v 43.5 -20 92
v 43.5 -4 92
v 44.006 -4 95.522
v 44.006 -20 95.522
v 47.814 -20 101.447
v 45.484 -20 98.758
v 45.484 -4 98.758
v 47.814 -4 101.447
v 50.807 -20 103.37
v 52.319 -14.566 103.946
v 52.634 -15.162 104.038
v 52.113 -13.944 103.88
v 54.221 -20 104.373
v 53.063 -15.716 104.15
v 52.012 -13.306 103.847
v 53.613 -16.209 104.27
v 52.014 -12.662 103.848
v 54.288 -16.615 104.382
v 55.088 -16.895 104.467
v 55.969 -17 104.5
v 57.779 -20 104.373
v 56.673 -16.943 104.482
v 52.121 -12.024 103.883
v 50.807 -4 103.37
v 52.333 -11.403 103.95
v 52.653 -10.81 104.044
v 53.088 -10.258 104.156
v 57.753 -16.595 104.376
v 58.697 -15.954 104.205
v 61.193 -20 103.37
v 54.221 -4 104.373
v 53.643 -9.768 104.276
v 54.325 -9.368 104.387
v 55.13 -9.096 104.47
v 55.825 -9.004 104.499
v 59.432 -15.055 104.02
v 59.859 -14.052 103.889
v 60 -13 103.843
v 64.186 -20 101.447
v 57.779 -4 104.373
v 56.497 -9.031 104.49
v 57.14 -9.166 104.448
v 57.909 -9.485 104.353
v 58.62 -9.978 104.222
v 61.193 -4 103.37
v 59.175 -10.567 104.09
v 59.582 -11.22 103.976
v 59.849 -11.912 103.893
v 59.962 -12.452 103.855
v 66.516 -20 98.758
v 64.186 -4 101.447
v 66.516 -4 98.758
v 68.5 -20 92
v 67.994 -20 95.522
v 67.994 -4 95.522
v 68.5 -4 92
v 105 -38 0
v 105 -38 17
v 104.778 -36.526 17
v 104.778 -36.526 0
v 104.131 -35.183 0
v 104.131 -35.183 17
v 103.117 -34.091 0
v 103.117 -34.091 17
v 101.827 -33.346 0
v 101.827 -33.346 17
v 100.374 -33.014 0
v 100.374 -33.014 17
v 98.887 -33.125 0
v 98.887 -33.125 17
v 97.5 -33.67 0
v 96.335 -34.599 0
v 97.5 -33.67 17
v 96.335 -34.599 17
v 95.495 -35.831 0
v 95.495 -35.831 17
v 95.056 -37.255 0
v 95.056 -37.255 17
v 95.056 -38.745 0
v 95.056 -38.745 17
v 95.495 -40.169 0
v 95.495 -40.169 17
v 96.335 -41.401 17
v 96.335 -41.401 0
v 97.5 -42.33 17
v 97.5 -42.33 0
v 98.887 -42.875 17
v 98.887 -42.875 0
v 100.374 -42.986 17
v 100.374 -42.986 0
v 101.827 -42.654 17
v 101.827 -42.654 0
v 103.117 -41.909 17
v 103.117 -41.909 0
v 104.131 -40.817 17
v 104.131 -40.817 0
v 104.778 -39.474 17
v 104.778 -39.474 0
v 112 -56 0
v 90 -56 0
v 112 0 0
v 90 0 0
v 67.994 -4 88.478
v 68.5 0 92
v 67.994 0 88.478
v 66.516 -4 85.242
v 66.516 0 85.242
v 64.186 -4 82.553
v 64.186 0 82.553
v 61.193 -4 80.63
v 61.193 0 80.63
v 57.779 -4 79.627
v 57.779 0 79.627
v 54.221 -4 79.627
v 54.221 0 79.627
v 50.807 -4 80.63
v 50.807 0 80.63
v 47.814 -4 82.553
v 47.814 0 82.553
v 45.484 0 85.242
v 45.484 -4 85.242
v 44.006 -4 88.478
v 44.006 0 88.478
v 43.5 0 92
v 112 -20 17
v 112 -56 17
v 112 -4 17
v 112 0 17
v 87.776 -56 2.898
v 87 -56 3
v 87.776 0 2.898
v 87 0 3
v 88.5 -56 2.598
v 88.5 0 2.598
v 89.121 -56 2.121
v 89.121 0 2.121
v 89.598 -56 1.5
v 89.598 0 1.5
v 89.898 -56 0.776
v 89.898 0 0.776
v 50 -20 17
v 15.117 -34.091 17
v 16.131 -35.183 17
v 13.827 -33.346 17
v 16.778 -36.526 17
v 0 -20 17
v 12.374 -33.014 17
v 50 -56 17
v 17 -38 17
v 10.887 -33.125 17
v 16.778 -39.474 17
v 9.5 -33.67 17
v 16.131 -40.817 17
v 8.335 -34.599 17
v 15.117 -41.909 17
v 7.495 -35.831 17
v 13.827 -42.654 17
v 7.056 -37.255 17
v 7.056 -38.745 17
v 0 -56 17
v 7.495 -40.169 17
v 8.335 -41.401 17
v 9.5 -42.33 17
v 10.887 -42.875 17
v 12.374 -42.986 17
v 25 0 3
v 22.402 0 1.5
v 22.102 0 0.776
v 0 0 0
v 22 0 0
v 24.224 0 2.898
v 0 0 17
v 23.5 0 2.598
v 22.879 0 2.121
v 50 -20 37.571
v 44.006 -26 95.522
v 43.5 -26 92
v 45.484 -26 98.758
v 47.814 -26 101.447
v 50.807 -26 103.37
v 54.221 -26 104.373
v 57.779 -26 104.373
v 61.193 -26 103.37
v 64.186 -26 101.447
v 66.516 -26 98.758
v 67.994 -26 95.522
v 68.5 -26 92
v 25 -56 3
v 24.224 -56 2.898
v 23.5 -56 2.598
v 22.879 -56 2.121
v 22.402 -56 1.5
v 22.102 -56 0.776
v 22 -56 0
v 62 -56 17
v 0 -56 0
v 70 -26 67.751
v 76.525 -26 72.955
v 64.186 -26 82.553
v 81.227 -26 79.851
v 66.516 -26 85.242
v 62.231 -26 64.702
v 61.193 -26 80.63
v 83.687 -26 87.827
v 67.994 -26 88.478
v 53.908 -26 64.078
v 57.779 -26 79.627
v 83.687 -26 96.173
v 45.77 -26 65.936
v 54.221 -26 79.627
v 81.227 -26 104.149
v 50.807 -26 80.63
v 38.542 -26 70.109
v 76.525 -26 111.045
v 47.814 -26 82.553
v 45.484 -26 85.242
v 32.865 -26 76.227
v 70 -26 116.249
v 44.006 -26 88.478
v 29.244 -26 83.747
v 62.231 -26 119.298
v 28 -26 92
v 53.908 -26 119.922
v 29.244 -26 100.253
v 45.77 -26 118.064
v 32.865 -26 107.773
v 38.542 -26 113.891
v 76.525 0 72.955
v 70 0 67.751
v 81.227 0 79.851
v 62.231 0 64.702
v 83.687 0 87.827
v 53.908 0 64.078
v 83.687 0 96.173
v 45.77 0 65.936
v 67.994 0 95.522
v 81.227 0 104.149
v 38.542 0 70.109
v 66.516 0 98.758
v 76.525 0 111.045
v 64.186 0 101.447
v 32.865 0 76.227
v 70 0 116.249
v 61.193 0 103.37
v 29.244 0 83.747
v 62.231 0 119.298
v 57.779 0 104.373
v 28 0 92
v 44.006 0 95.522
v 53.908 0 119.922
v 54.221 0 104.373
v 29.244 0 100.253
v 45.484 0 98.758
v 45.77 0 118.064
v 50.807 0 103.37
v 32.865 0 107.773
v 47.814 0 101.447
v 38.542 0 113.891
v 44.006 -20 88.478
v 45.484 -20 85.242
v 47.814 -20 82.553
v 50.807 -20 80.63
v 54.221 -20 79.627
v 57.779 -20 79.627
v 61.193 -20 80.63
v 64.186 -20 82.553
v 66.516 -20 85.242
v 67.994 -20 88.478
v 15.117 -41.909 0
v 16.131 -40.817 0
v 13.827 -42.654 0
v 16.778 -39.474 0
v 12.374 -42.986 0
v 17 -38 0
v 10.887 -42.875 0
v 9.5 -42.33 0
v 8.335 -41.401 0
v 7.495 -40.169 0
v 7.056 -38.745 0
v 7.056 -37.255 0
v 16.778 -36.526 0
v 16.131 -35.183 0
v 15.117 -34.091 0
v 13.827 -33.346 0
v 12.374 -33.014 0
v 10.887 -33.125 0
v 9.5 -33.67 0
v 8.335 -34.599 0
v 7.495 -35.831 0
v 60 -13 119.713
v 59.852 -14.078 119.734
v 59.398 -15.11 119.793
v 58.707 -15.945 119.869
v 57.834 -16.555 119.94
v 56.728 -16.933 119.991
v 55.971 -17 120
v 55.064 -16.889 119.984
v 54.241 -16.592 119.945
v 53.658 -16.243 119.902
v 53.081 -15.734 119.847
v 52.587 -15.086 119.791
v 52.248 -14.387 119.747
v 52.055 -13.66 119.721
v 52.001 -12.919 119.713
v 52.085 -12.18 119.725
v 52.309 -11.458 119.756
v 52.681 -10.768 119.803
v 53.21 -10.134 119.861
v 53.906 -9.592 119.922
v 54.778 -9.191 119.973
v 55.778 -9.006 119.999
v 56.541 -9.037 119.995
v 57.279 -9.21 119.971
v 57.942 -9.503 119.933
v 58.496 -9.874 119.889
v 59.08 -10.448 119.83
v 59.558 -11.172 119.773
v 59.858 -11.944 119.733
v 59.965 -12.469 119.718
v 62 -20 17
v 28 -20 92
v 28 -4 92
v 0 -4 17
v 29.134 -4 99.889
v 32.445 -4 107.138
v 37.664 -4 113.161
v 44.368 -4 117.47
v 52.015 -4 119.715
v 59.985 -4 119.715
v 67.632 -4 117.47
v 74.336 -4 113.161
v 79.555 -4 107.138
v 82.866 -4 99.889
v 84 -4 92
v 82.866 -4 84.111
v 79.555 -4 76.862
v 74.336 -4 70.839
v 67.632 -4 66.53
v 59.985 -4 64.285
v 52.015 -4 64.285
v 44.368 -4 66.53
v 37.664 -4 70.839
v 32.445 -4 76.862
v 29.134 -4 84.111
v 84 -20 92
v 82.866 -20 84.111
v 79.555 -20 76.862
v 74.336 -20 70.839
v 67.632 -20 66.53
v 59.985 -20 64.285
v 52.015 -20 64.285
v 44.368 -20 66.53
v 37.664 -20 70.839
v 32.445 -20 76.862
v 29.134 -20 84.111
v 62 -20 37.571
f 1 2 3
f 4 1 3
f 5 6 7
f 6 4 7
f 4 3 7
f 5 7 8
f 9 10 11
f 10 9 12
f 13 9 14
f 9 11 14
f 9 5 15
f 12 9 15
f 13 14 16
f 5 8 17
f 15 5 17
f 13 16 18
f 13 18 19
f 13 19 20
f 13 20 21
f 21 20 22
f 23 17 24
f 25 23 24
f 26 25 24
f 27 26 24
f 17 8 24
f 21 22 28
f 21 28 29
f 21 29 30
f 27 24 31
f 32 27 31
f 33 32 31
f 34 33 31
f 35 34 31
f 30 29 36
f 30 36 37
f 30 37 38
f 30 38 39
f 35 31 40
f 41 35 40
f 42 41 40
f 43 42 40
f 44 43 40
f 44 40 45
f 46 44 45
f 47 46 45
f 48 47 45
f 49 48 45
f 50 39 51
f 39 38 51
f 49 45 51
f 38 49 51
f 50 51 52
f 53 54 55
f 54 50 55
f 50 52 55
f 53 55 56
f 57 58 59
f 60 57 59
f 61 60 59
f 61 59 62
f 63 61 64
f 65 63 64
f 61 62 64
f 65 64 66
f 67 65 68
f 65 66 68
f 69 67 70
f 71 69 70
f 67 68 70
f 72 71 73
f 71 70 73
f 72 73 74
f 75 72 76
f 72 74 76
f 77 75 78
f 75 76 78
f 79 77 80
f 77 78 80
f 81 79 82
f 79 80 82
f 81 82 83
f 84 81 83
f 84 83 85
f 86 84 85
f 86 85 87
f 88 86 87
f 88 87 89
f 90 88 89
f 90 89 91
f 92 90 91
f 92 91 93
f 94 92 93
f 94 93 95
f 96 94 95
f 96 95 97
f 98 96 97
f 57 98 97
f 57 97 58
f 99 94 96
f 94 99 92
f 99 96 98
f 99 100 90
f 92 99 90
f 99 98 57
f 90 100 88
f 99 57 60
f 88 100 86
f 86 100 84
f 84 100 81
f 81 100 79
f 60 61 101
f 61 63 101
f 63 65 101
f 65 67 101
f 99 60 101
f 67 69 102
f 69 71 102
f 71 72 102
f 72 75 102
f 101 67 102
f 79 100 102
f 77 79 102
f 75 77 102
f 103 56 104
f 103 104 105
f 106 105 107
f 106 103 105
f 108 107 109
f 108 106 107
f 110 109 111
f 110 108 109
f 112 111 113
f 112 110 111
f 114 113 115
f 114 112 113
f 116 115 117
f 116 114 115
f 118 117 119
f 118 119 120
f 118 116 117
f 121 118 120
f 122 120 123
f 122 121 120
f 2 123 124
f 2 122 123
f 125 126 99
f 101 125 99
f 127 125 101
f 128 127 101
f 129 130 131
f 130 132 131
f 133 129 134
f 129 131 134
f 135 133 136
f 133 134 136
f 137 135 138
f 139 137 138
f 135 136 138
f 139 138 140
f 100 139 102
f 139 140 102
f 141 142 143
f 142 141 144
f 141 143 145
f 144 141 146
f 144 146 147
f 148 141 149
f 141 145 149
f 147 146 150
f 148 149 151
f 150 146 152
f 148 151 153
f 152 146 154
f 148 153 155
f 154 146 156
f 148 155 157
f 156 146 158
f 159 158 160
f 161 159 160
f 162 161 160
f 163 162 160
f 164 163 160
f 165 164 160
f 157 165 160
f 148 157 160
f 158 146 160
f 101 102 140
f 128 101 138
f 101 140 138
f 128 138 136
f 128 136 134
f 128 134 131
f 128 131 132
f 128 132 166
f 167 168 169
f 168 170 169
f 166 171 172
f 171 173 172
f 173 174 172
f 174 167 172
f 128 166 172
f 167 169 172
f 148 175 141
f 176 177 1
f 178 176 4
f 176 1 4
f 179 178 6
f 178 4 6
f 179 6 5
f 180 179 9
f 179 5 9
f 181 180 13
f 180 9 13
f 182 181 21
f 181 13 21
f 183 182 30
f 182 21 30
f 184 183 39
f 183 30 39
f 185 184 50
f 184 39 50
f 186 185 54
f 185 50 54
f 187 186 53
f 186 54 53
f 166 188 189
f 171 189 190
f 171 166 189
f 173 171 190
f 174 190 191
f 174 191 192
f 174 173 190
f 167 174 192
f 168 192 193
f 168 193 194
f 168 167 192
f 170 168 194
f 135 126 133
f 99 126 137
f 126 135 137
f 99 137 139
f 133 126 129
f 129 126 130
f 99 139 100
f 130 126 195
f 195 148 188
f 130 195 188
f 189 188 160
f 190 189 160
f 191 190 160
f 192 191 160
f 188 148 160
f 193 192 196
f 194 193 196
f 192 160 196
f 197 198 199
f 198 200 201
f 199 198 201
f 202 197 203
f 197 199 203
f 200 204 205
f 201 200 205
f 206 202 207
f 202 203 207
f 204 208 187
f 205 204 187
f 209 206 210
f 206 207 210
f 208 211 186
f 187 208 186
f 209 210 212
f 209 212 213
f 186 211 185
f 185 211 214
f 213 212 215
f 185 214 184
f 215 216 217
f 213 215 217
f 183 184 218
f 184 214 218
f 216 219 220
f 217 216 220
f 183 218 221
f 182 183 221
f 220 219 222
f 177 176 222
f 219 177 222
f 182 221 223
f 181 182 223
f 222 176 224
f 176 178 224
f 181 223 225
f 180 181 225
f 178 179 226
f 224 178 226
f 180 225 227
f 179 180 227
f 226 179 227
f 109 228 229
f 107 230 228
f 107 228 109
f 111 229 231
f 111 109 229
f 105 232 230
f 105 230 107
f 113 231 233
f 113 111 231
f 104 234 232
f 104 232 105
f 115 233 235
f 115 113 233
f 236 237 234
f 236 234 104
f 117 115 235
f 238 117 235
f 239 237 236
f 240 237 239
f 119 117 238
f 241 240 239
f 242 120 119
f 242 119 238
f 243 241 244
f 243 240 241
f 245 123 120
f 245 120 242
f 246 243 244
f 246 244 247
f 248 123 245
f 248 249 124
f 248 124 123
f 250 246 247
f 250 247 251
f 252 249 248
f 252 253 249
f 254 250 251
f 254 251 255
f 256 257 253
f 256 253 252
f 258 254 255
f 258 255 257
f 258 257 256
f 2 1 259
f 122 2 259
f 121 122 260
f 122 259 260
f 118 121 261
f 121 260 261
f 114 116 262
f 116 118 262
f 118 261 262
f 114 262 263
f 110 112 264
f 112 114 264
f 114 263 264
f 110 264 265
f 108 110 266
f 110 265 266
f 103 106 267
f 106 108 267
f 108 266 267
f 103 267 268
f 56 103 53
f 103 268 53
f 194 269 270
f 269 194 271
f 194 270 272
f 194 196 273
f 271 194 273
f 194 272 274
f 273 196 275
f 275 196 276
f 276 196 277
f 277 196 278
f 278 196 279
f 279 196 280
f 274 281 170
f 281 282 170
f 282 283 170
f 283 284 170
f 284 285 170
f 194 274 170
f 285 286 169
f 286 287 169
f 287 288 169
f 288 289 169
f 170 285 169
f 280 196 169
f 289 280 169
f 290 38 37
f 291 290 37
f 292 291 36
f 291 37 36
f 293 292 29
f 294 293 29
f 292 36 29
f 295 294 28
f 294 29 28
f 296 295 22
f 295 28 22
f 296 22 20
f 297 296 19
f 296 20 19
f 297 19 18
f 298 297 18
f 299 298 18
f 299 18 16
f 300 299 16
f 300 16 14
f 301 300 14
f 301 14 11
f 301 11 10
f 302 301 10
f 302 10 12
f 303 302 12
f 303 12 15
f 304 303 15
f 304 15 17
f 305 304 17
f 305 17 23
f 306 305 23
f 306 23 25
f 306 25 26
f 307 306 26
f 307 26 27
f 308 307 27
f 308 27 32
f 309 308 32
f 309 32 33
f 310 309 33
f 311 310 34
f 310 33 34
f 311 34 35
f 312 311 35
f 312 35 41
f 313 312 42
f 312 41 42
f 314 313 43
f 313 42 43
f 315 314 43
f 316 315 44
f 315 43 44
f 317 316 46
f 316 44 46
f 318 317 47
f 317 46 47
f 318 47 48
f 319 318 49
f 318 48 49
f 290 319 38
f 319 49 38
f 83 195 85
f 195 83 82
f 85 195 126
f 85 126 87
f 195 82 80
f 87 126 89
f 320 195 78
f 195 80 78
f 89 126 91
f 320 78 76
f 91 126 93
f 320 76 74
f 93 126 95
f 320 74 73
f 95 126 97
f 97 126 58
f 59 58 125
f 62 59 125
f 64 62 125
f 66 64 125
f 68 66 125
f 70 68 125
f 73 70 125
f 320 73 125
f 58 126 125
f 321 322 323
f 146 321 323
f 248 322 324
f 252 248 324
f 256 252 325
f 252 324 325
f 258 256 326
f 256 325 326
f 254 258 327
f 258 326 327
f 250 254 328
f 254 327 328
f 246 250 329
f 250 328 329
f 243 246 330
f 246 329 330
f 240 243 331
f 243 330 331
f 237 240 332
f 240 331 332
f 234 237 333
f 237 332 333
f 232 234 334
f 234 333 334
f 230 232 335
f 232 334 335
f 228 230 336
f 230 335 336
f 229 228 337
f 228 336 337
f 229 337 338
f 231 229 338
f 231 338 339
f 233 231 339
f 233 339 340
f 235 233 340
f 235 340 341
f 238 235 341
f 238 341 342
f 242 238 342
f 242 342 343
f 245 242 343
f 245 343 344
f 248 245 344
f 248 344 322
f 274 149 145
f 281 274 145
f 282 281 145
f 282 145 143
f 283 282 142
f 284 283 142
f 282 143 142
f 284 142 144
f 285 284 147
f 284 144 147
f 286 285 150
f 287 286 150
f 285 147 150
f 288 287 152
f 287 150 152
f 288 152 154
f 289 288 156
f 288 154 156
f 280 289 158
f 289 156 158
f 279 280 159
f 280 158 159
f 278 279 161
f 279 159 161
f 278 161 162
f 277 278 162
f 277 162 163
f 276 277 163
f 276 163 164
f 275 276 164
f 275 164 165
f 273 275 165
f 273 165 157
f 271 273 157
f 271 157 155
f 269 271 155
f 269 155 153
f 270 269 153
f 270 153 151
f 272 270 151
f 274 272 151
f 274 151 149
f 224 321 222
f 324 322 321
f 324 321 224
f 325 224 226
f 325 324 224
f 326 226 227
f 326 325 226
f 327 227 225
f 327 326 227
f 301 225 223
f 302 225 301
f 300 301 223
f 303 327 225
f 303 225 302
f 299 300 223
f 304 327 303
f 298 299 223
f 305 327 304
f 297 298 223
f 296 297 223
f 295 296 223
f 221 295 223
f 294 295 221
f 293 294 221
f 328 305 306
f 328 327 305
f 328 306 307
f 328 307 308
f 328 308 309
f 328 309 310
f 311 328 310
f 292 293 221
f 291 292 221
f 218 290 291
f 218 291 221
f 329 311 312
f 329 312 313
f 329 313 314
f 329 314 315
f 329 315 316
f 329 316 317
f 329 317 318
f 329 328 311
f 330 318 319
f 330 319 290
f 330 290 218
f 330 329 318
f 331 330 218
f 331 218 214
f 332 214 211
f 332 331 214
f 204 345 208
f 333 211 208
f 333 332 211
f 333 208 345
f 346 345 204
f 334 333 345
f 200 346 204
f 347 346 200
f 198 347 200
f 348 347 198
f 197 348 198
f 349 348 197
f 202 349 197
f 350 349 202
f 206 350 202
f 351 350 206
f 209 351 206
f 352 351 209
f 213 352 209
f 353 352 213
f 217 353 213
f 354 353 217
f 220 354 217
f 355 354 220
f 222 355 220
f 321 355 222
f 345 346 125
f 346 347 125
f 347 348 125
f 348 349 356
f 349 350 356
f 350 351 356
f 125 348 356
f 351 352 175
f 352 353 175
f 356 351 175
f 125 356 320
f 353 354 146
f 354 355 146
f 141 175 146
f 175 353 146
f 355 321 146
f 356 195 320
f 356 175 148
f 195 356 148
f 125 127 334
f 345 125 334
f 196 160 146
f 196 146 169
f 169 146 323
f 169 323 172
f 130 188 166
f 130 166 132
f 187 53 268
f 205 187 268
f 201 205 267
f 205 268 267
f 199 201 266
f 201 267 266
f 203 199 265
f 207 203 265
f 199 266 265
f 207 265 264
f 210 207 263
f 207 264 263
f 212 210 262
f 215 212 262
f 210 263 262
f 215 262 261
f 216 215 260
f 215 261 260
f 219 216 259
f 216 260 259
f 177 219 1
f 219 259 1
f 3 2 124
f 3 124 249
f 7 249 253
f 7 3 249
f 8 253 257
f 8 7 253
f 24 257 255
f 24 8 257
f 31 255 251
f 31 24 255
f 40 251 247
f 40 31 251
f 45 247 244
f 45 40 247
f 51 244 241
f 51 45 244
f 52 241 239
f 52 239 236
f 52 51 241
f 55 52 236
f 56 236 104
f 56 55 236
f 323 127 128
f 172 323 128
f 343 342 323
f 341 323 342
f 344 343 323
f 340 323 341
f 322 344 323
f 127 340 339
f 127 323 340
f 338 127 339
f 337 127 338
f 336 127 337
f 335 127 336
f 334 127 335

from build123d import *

# Parameters (mm, degrees)
F1_DEPTH       = 112
F2_W           = 4
F2_H           = 75
F3_DEPTH       = 112.001
F5_DEPTH       = 50
F7_DEPTH       = 50
F9_DEPTH       = 25
F8_R           = 12.5
F10_DEPTH      = 4
F10_DEPTH_BACK = 22
F12_W          = 68
F12_H          = 3
F13_DEPTH      = 56.001
F14_R          = 5
F15_DEPTH      = 25
F16_R          = 4
F17_DEPTH      = 117.001
F18_R          = 4
F19_DEPTH      = 80
F11_R          = 12.5
F20_DEPTH      = 25
F20_DEPTH_BACK = 25
F21_R          = 2.99999


# Not quite as in the source:
# - a fillet or chamfer is up to 0.001 mm smaller than in the source, because OpenCascade refuses the exact size
# - a feature names something its author has since deleted; it is built from what else it names


with BuildPart() as f1:
    # F0 (on Right) → F1 (new body)
    with BuildSketch(Plane.YZ):
        Polygon((-56, 0), (0, 0), (0, 49), (0, 92), (-20, 92), (-20, 37.5714285714), (-56, 17), align=None)
    extrude(amount=F1_DEPTH)

    # F2 (on face) → F3 (cut, through all)
    with BuildSketch(Plane.YZ.offset(112)):
        with Locations((-2, 54.5)):
            Rectangle(F2_W, F2_H)
    extrude(amount=-F3_DEPTH, mode=Mode.SUBTRACT)

    # F4 (on face) → F5 (cut)
    with BuildSketch(Plane.YZ.offset(112)):
        Polygon((-20, 37.5714285714), (-56, 17), (-20, 17), align=None)
    extrude(amount=-F5_DEPTH, mode=Mode.SUBTRACT)

    # F6 (on face) → F7 (cut)
    with BuildSketch(Plane(origin=(0, 0, 0), x_dir=(0, -1, 0), z_dir=(-1, 0, 0))):
        Polygon((20, 17), (56, 17), (20, 37.5714285714), align=None)
    extrude(amount=-F7_DEPTH, mode=Mode.SUBTRACT)

    # F8 (on face) → F9 (cut)
    with BuildSketch(Plane(origin=(0, -4, 0), x_dir=(-1, 0, 0), z_dir=(0, 1, 0))):
        Polygon((-112, 17), (-84, 92), (-112, 92), align=None)
        Polygon((0, 92), (-28, 92), (0, 17), align=None)
    extrude(amount=-F9_DEPTH, mode=Mode.SUBTRACT)

    # F8 (on face) → F10 (join, two sides)
    with BuildSketch(Plane(origin=(0, -4, 0), x_dir=(-1, 0, 0), z_dir=(0, 1, 0))) as f10_sk:
        with BuildLine():
            ThreePointArc((-84, 92), (-56, 64), (-28, 92))
            ThreePointArc((-28, 92), (-56, 120), (-84, 92))
        make_face()
        with Locations((-56, 92)):
            Circle(F8_R, mode=Mode.SUBTRACT)
    extrude(amount=F10_DEPTH)
    extrude(f10_sk.sketch, amount=-F10_DEPTH_BACK)

    # F12 (on face) → F13 (cut, through all)
    with BuildSketch(Plane.XZ.offset(56)):
        with Locations((56, 1.5)):
            Rectangle(F12_W, F12_H)
    extrude(amount=-F13_DEPTH, mode=Mode.SUBTRACT)

    # F14 (on face) → F15 (cut)
    with BuildSketch(Plane.XY.offset(17)):
        with Locations((12, -38)):
            Circle(F14_R)
        with Locations((100, -38)):
            Circle(F14_R)
    extrude(amount=-F15_DEPTH, mode=Mode.SUBTRACT)

    # F16 (on face) → F17 (cut, through all)
    with BuildSketch(Plane(origin=(0, 0, 3), x_dir=(1, 0, 0), z_dir=(0, 0, -1))):
        with Locations((56, 13)):
            Circle(F16_R)
    extrude(amount=-F17_DEPTH, mode=Mode.SUBTRACT)

    # F18 (on face) → F19 (join)
    with BuildSketch(Plane(origin=(0, 0, 3), x_dir=(1, 0, 0), z_dir=(0, 0, -1))):
        with Locations((56, 13)):
            Circle(F18_R)
    extrude(amount=-F19_DEPTH)

    # F11 (on face) → F20 (cut, two sides)
    with BuildSketch(Plane.XZ.offset(20)) as f20_sk:
        with Locations((56, 92)):
            Circle(F11_R)
    extrude(amount=-F20_DEPTH, mode=Mode.SUBTRACT)
    extrude(f20_sk.sketch, amount=F20_DEPTH_BACK, mode=Mode.SUBTRACT)

    # F21 (radius 3 in the source; OpenCascade refuses exactly that, so slightly less here)
    f21_edges = [f1.edges().sort_by_distance(p)[0] for p in [
        (22, -28, 3),
        (90, -28, 3),
    ]]
    fillet(f21_edges, radius=F21_R)


solid = f1.part
